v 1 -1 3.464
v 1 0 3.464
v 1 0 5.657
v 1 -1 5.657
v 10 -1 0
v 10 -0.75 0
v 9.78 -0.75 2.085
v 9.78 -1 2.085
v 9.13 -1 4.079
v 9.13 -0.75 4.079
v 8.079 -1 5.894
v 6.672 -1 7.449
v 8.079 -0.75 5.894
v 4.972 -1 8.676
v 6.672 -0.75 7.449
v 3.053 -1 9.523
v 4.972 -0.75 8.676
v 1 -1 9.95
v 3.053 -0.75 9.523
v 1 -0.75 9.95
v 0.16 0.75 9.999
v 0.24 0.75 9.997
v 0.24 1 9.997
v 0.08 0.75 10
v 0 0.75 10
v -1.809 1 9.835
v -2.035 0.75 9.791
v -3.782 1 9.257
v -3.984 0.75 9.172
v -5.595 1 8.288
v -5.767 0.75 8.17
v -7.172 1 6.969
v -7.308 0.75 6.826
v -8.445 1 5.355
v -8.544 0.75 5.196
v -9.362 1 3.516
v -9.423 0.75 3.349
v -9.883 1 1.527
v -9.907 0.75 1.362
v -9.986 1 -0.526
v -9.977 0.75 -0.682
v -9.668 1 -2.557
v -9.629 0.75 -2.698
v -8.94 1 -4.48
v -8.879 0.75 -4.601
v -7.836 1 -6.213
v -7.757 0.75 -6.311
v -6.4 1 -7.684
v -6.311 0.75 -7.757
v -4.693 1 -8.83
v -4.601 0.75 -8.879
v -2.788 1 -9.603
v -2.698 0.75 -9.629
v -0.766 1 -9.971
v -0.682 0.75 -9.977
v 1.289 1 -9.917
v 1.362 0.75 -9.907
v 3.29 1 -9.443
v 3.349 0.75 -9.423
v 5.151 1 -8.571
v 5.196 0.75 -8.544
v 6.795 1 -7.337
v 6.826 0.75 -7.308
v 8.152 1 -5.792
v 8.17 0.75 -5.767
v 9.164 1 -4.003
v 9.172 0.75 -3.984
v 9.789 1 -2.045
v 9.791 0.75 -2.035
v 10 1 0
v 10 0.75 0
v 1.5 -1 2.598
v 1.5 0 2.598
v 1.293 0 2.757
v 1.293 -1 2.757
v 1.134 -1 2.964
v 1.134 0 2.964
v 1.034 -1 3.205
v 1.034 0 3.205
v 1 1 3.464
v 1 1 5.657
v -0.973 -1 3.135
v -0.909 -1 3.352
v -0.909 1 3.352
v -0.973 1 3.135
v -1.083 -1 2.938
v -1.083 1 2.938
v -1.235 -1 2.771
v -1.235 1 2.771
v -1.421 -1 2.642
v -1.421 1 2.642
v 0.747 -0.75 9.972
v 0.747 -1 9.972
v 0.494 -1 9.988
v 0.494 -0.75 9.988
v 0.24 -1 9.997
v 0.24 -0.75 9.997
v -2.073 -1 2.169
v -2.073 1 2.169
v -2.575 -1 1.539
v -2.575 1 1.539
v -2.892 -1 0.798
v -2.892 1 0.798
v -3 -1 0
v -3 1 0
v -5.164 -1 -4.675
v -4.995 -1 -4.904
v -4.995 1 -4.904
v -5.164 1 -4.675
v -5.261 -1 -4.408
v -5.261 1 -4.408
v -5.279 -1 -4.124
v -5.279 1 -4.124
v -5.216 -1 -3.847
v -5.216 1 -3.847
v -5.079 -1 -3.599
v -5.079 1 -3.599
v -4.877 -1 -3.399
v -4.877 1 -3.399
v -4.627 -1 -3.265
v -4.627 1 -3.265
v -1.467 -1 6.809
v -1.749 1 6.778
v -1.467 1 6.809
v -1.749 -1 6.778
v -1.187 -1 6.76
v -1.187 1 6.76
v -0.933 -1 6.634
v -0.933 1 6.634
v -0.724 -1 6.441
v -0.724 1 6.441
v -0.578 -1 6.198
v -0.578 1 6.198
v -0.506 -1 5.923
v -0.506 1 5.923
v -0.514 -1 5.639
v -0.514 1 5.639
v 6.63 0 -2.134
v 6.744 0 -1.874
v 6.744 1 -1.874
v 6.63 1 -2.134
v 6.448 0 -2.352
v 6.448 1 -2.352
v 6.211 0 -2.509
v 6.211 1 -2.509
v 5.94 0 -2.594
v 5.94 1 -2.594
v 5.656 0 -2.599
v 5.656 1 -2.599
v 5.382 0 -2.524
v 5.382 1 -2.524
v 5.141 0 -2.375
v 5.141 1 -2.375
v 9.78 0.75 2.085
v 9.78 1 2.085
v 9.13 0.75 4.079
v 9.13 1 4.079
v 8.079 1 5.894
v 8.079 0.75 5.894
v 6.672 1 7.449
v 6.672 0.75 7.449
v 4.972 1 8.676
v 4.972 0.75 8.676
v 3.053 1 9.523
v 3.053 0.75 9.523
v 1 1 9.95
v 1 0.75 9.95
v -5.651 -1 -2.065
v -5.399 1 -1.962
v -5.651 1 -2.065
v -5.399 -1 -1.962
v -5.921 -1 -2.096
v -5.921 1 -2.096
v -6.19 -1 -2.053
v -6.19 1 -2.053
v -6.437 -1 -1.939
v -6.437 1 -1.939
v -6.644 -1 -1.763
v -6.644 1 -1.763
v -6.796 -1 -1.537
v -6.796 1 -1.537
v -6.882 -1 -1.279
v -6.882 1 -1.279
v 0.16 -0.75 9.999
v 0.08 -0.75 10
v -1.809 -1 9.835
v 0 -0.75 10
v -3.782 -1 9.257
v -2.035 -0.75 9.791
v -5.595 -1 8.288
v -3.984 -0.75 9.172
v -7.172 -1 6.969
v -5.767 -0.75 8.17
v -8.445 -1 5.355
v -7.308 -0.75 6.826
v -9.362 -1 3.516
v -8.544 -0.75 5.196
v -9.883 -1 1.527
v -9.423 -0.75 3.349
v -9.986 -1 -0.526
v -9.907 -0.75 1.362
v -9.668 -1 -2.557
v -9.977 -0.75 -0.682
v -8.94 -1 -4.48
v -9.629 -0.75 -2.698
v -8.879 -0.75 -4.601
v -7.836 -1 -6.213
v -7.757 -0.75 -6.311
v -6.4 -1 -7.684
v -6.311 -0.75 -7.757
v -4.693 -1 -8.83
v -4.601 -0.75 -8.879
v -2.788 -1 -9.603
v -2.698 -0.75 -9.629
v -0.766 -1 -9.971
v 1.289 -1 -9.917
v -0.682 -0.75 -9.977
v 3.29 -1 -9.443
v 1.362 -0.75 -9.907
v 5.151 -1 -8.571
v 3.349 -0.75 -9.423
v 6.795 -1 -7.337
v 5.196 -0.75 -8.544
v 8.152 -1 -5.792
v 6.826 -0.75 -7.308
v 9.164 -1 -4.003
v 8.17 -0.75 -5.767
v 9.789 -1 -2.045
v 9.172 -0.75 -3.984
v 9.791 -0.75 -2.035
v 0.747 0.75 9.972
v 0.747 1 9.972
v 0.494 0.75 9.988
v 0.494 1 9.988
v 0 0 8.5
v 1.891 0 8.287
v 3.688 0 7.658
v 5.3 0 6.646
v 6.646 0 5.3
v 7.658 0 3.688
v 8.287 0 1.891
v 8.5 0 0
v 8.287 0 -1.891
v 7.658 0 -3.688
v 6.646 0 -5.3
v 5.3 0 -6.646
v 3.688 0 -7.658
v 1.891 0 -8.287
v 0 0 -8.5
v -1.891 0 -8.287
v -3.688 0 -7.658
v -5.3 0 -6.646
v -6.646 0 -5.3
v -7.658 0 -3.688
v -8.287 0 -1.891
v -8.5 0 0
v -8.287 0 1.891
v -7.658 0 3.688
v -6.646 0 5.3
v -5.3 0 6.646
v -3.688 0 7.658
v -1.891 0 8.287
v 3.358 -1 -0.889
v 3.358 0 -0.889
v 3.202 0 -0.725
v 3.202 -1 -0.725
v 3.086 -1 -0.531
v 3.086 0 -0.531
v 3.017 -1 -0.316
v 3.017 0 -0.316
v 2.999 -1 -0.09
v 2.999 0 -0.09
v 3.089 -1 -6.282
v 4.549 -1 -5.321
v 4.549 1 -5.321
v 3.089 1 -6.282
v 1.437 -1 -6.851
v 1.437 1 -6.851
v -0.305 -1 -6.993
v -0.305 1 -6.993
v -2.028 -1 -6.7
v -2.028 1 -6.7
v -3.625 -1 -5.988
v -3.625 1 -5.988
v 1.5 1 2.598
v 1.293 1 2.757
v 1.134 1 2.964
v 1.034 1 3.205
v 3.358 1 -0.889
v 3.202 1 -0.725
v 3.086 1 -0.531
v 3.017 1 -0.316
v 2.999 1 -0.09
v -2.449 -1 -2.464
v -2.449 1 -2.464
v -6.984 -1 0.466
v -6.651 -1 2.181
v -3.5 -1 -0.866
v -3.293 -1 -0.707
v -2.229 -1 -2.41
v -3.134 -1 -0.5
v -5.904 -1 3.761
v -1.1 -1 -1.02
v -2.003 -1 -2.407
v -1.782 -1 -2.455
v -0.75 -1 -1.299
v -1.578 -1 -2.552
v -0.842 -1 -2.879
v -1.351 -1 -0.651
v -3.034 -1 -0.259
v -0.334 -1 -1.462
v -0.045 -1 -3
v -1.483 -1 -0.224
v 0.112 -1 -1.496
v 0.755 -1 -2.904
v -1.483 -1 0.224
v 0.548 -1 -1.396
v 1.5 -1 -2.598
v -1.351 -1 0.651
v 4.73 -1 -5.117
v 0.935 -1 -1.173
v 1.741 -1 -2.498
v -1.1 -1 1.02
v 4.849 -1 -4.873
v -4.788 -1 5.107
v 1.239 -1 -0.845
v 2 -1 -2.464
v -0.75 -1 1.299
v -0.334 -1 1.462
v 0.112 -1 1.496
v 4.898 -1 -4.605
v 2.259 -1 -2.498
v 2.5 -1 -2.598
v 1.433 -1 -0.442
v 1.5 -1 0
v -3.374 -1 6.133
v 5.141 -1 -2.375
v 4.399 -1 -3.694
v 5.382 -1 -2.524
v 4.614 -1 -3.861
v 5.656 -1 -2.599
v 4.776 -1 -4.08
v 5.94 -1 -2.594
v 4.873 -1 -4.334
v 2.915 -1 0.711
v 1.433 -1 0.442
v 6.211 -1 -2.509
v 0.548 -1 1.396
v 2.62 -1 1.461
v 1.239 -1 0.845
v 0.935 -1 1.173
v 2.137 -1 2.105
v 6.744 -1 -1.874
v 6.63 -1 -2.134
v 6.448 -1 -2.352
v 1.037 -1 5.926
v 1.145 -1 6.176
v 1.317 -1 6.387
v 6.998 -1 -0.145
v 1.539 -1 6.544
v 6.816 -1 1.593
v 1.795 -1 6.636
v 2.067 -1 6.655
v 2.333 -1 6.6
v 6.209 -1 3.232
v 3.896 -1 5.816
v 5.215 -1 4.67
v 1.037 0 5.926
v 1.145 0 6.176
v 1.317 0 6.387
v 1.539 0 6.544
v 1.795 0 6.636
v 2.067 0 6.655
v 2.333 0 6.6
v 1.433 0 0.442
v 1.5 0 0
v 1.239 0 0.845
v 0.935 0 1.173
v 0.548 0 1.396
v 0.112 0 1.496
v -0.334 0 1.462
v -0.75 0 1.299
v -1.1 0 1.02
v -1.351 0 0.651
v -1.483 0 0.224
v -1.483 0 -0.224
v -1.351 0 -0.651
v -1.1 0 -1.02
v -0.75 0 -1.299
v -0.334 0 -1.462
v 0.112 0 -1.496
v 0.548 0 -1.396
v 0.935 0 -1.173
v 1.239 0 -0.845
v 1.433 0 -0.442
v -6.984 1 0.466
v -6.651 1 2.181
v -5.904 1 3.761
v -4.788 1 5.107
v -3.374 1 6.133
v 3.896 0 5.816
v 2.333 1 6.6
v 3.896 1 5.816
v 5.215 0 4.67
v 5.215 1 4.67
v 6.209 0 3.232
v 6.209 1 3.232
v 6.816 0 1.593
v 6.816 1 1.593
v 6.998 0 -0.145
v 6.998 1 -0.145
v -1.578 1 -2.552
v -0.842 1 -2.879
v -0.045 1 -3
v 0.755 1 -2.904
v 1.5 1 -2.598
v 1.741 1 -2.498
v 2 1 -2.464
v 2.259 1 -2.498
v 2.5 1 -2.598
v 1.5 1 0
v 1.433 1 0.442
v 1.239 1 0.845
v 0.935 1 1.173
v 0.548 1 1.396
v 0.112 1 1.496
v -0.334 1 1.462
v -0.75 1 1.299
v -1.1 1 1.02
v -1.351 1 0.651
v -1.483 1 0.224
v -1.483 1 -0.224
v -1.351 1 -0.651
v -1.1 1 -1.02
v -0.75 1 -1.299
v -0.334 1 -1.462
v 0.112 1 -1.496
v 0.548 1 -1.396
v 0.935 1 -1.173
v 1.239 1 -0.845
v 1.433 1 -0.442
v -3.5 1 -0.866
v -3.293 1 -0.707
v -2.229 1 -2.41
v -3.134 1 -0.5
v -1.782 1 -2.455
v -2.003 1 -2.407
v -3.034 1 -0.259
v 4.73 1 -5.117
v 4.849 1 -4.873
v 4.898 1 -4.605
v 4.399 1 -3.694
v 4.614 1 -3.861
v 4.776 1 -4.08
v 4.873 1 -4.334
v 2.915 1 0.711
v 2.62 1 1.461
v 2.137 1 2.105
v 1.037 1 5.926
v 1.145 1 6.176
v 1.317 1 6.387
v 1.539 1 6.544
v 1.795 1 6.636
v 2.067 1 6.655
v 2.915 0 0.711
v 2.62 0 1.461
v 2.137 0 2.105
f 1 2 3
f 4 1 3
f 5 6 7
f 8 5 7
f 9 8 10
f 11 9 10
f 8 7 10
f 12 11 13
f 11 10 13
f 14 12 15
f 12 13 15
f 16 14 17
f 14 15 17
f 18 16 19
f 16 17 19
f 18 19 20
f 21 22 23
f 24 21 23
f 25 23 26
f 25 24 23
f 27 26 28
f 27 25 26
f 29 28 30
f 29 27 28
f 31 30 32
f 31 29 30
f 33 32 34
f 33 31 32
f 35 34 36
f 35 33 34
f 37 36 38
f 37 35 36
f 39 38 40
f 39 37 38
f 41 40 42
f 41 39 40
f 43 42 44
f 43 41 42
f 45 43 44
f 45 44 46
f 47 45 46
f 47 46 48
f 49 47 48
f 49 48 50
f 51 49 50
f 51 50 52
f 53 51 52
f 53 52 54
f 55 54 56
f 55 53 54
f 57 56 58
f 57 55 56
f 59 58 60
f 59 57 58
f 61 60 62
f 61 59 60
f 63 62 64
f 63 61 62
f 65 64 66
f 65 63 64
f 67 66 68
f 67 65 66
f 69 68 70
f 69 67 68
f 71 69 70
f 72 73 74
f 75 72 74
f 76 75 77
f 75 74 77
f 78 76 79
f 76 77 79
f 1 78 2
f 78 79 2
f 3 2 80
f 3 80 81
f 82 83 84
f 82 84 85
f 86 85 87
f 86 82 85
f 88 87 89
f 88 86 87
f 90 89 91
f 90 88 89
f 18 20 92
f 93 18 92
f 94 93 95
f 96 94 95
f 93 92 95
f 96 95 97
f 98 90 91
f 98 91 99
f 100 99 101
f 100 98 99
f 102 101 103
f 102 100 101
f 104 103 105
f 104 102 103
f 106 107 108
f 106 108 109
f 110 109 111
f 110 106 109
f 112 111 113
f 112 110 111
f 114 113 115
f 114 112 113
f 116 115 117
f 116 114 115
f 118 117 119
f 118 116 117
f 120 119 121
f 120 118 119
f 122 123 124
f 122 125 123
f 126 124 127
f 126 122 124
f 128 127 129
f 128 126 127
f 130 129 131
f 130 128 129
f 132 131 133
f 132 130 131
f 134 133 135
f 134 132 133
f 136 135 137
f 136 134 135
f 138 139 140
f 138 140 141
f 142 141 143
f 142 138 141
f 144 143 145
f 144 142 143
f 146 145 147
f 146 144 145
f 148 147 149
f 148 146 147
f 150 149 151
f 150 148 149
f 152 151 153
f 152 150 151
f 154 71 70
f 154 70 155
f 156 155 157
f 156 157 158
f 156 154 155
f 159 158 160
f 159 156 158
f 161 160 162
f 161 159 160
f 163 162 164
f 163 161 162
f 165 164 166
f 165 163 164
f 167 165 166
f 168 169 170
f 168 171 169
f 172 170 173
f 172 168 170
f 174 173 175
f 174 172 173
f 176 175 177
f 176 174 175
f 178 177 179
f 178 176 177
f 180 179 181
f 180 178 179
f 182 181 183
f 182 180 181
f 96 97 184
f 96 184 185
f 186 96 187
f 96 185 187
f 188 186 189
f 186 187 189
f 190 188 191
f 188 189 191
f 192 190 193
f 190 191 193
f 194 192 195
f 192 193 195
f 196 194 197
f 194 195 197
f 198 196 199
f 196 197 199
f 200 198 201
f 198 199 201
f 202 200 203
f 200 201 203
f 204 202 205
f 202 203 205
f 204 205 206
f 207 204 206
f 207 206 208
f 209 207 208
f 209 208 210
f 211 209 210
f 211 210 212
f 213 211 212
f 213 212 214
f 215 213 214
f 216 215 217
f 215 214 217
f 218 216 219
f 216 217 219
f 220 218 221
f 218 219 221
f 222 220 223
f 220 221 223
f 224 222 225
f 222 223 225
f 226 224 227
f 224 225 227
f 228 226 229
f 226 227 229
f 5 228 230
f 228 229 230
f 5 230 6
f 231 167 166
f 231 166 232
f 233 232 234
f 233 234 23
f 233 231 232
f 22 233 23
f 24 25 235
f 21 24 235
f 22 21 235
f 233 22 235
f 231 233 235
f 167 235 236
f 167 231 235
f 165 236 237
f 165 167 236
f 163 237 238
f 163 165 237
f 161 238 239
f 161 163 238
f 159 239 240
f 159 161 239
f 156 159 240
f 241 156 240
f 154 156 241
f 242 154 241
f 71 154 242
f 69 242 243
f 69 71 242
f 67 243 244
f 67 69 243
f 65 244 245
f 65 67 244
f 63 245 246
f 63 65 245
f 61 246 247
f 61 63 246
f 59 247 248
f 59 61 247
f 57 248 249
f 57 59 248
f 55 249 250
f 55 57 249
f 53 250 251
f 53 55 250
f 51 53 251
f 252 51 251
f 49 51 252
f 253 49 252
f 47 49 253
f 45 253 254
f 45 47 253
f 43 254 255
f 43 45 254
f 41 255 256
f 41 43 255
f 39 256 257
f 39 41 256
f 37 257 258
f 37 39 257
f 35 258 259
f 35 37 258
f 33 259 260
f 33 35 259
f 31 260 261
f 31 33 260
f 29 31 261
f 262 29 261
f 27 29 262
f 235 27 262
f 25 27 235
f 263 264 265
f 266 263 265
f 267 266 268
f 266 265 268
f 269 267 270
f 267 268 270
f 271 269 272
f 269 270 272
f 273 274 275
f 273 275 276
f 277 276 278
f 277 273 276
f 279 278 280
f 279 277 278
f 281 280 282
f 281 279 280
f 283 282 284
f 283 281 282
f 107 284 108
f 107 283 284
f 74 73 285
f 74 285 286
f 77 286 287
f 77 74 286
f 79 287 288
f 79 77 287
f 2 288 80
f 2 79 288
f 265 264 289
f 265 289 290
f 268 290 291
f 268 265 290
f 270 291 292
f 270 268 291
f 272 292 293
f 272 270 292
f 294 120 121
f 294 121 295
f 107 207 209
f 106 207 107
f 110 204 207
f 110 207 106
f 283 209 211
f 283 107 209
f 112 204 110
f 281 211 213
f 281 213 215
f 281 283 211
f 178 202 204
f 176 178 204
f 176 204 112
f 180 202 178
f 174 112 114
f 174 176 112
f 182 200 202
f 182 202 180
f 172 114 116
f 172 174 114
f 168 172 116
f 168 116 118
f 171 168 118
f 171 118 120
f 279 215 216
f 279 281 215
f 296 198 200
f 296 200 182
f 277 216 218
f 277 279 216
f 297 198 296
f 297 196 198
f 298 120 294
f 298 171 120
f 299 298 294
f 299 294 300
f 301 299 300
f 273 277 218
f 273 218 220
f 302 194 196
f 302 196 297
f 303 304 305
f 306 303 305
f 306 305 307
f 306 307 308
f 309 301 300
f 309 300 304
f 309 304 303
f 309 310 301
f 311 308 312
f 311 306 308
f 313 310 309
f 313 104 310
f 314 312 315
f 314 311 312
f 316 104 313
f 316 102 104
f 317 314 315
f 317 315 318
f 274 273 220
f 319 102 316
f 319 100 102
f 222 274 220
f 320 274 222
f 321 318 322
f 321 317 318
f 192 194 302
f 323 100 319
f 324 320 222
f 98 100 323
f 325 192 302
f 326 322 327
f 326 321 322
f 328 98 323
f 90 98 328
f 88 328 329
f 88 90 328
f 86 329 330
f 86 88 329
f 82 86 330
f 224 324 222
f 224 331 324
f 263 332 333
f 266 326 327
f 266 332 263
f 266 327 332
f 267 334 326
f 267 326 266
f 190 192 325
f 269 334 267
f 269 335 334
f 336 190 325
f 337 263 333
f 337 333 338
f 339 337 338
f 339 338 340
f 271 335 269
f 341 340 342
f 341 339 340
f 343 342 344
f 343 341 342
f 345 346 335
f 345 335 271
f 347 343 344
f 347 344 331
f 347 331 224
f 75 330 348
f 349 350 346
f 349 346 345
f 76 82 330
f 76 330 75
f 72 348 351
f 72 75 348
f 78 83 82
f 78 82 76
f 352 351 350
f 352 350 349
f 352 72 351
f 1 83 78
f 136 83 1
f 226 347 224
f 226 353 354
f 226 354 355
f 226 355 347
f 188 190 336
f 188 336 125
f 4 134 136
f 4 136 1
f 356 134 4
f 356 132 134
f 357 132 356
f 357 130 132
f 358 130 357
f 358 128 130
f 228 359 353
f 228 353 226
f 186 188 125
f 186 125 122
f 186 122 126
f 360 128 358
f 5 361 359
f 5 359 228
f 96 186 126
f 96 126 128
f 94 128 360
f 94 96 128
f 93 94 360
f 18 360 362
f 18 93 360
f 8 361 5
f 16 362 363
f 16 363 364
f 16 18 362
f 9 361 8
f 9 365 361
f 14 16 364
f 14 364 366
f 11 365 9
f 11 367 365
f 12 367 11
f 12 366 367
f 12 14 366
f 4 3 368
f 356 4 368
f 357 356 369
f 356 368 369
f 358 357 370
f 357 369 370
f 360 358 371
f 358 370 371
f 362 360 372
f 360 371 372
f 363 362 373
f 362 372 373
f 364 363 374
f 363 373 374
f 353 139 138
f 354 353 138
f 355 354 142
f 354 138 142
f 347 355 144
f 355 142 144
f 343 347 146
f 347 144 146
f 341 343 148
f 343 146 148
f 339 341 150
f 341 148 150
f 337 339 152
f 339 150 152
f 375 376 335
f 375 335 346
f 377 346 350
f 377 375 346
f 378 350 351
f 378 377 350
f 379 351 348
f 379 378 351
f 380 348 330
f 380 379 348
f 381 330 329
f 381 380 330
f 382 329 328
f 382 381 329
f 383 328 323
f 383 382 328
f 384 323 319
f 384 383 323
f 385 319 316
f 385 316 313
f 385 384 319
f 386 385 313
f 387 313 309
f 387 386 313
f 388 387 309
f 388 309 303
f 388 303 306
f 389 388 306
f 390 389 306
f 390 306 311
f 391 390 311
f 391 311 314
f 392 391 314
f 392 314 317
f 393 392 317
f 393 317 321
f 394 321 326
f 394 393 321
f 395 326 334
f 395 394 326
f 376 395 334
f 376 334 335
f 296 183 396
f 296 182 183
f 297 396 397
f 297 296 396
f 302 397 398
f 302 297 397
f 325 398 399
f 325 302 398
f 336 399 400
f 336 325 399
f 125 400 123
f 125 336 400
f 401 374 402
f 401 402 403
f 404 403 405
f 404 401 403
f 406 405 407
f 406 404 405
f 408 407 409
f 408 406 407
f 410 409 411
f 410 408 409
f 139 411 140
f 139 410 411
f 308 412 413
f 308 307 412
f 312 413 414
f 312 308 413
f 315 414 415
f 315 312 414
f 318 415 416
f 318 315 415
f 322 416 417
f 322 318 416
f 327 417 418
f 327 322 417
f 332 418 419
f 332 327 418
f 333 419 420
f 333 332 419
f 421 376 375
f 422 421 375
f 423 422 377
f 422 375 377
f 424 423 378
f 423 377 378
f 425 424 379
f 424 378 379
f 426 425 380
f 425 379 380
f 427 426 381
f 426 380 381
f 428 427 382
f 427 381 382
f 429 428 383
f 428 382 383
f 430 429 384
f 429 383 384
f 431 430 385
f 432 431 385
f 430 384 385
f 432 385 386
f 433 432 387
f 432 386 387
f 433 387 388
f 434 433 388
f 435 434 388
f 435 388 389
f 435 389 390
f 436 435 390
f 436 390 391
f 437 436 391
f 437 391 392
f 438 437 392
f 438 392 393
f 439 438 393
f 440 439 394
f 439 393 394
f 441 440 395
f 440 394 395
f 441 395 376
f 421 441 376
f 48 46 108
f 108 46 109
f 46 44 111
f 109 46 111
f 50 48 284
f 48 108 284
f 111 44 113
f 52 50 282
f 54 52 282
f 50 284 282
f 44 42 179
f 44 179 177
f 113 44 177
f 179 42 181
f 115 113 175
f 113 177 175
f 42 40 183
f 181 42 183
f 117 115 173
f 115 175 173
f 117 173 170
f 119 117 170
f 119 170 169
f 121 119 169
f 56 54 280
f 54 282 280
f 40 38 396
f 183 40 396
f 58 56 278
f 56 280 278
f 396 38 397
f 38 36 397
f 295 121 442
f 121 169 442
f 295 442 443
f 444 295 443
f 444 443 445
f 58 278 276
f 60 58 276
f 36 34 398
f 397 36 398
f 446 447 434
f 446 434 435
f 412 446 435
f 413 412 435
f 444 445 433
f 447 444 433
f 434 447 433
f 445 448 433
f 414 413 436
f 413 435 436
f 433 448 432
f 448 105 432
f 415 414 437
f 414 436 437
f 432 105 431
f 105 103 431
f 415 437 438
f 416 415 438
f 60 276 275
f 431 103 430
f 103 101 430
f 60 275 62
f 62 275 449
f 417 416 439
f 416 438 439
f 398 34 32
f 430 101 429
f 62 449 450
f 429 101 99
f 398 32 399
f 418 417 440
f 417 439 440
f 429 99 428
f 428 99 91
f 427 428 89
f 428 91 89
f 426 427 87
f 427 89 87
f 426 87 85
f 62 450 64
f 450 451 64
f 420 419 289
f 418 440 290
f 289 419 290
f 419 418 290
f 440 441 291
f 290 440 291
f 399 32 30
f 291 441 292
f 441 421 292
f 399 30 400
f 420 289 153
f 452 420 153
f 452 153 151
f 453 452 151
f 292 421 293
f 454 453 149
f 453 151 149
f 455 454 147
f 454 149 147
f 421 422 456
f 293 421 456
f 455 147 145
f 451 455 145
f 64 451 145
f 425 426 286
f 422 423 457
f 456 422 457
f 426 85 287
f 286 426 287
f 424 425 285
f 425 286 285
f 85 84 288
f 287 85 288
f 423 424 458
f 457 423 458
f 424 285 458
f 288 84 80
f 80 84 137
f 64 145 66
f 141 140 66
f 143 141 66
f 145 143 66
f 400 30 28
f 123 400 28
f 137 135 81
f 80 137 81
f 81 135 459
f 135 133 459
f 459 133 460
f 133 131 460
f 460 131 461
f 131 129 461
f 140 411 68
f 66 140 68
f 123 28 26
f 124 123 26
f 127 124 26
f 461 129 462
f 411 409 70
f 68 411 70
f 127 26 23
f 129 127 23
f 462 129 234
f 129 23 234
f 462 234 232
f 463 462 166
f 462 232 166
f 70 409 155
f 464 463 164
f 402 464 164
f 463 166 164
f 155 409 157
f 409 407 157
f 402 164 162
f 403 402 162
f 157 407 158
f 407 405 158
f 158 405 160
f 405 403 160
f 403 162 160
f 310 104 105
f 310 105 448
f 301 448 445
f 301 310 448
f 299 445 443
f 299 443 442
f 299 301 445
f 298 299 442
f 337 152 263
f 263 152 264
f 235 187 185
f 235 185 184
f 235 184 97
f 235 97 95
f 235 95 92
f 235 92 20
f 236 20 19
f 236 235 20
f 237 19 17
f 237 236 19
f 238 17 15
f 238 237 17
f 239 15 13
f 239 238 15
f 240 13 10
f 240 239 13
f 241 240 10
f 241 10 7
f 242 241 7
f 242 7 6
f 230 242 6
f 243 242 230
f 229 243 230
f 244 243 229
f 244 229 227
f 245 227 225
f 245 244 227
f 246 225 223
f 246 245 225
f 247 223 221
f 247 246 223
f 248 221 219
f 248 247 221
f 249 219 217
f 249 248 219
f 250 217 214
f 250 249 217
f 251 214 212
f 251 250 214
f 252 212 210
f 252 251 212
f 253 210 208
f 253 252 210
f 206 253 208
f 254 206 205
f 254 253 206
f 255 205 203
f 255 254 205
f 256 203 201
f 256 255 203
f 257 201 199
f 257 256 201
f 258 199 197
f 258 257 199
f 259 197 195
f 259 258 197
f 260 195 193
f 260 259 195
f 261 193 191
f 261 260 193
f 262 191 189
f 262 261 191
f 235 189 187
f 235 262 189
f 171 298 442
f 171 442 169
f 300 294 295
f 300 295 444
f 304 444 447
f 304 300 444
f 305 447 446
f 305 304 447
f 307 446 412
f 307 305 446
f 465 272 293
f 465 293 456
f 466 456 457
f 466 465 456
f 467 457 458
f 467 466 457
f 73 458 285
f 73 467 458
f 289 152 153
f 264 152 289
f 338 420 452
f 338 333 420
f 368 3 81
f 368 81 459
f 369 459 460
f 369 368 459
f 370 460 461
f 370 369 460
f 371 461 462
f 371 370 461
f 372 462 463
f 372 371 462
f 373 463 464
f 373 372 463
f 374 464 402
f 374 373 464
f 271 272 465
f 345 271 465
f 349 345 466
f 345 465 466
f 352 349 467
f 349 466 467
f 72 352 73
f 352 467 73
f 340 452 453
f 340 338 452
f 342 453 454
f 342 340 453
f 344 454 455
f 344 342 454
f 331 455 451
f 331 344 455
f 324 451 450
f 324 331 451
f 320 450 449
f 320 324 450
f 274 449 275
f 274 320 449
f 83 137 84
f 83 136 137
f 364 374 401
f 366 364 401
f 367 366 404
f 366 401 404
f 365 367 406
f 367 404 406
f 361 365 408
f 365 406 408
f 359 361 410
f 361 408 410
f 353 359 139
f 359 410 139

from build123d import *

# Parameters (mm, degrees)
F0_R     = 1.5
F1_DEPTH = 1


# Not quite as in the source:
# - ends of sketch curves that miss each other by under 0.0002 mm in the source are joined


with BuildPart() as f1:
    # F0 (on Front) → F1 (new body, symmetric)
    with BuildSketch(Plane.XZ):
        with BuildLine():
            ThreePointArc((0.2401150839, 9.9971168217), (-7.1554577365, -6.985658493), (10, 0))
            ThreePointArc((10, 0), (7.4161984871, 6.7082039325), (1, 9.9498743711))
            ThreePointArc((1, 9.9498743711), (0.6205086012, 9.9807298869), (0.2401150839, 9.9971168217))
        make_face()
        with BuildLine():
            ThreePointArc((4.5488093998, -5.3205575877), (-0.3054811817, -6.9933311982), (-4.9954209636, -4.90364858))
            ThreePointArc((-4.9954209636, -4.90364858), (-5.2574280938, -3.9837438223), (-4.6268502112, -3.2645470249))
            Line((-4.6268502112, -3.2645470249), (-2.4485091499, -2.4636990679))
            ThreePointArc((-2.4485091499, -2.4636990679), (-2.0029061262, -2.4073466036), (-1.5775862521, -2.551709548))
            ThreePointArc((-1.5775862521, -2.551709548), (-0.0451926266, -2.9996595851), (1.5, -2.5980762114))
            ThreePointArc((1.5, -2.5980762114), (2, -2.4641016151), (2.5, -2.5980762114))
            Line((2.5, -2.5980762114), (4.3989794856, -3.6944525285))
            ThreePointArc((4.3989794856, -3.6944525285), (4.8947614013, -4.4687262228), (4.5488093998, -5.3205575877))
        make_face(mode=Mode.SUBTRACT)
        with BuildLine():
            ThreePointArc((-0.9093714051, 3.3523206591), (-1.0833702513, 2.9382408884), (-1.4210521656, 2.6420845449))
            ThreePointArc((-1.4210521656, 2.6420845449), (-2.5751850901, 1.5389677552), (-3, 0))
            ThreePointArc((-3, 0), (-3.1339745962, -0.5), (-3.5, -0.8660254038))
            Line((-3.5, -0.8660254038), (-5.3989794856, -1.962401721))
            ThreePointArc((-5.3989794856, -1.962401721), (-6.3174111322, -2.0046246076), (-6.8821427332, -1.2791057034))
            ThreePointArc((-6.8821427332, -1.2791057034), (-5.9036618838, 3.7612200629), (-1.7489737597, 6.7779857471))
            ThreePointArc((-1.7489737597, 6.7779857471), (-0.8213093054, 6.5449381989), (-0.5137555498, 5.6392433348))
            Line((-0.5137555498, 5.6392433348), (-0.9093714051, 3.3523206591))
        make_face(mode=Mode.SUBTRACT)
        Circle(F0_R, mode=Mode.SUBTRACT)
        with BuildLine():
            Line((1, 3.4641016151), (1, 5.6568542495))
            ThreePointArc((1, 5.6568542495), (1.4226497308, 6.4733508304), (2.3333333333, 6.5996632911))
            ThreePointArc((2.3333333333, 6.5996632911), (6.2091430656, 3.2321111353), (6.7443947233, -1.8743371671))
            ThreePointArc((6.7443947233, -1.8743371671), (6.0787373992, -2.5611943766), (5.140605761, -2.3746963099))
            Line((5.140605761, -2.3746963099), (3.357880555, -0.8886215913))
            ThreePointArc((3.357880555, -0.8886215913), (3.0862763775, -0.5308942848), (2.9986384177, -0.090374997))
            ThreePointArc((2.9986384177, -0.090374997), (2.6203777167, 1.4606918299), (1.5, 2.5980762114))
            ThreePointArc((1.5, 2.5980762114), (1.1339745962, 2.9641016151), (1, 3.4641016151))
        make_face(mode=Mode.SUBTRACT)
    extrude(amount=F1_DEPTH, both=True)

    # F2 (on Right) → F3 (revolve, cut)
    with BuildSketch(Plane.YZ):
        Polygon((-0.75, 10), (0, 8.5), (0, 10), align=None)
        Polygon((0, 10), (0, 8.5), (0.75, 10), align=None)
    revolve(axis=Axis((0, 4.7748805955, 0), (0, 1, 0)), mode=Mode.SUBTRACT)


solid = f1.part
